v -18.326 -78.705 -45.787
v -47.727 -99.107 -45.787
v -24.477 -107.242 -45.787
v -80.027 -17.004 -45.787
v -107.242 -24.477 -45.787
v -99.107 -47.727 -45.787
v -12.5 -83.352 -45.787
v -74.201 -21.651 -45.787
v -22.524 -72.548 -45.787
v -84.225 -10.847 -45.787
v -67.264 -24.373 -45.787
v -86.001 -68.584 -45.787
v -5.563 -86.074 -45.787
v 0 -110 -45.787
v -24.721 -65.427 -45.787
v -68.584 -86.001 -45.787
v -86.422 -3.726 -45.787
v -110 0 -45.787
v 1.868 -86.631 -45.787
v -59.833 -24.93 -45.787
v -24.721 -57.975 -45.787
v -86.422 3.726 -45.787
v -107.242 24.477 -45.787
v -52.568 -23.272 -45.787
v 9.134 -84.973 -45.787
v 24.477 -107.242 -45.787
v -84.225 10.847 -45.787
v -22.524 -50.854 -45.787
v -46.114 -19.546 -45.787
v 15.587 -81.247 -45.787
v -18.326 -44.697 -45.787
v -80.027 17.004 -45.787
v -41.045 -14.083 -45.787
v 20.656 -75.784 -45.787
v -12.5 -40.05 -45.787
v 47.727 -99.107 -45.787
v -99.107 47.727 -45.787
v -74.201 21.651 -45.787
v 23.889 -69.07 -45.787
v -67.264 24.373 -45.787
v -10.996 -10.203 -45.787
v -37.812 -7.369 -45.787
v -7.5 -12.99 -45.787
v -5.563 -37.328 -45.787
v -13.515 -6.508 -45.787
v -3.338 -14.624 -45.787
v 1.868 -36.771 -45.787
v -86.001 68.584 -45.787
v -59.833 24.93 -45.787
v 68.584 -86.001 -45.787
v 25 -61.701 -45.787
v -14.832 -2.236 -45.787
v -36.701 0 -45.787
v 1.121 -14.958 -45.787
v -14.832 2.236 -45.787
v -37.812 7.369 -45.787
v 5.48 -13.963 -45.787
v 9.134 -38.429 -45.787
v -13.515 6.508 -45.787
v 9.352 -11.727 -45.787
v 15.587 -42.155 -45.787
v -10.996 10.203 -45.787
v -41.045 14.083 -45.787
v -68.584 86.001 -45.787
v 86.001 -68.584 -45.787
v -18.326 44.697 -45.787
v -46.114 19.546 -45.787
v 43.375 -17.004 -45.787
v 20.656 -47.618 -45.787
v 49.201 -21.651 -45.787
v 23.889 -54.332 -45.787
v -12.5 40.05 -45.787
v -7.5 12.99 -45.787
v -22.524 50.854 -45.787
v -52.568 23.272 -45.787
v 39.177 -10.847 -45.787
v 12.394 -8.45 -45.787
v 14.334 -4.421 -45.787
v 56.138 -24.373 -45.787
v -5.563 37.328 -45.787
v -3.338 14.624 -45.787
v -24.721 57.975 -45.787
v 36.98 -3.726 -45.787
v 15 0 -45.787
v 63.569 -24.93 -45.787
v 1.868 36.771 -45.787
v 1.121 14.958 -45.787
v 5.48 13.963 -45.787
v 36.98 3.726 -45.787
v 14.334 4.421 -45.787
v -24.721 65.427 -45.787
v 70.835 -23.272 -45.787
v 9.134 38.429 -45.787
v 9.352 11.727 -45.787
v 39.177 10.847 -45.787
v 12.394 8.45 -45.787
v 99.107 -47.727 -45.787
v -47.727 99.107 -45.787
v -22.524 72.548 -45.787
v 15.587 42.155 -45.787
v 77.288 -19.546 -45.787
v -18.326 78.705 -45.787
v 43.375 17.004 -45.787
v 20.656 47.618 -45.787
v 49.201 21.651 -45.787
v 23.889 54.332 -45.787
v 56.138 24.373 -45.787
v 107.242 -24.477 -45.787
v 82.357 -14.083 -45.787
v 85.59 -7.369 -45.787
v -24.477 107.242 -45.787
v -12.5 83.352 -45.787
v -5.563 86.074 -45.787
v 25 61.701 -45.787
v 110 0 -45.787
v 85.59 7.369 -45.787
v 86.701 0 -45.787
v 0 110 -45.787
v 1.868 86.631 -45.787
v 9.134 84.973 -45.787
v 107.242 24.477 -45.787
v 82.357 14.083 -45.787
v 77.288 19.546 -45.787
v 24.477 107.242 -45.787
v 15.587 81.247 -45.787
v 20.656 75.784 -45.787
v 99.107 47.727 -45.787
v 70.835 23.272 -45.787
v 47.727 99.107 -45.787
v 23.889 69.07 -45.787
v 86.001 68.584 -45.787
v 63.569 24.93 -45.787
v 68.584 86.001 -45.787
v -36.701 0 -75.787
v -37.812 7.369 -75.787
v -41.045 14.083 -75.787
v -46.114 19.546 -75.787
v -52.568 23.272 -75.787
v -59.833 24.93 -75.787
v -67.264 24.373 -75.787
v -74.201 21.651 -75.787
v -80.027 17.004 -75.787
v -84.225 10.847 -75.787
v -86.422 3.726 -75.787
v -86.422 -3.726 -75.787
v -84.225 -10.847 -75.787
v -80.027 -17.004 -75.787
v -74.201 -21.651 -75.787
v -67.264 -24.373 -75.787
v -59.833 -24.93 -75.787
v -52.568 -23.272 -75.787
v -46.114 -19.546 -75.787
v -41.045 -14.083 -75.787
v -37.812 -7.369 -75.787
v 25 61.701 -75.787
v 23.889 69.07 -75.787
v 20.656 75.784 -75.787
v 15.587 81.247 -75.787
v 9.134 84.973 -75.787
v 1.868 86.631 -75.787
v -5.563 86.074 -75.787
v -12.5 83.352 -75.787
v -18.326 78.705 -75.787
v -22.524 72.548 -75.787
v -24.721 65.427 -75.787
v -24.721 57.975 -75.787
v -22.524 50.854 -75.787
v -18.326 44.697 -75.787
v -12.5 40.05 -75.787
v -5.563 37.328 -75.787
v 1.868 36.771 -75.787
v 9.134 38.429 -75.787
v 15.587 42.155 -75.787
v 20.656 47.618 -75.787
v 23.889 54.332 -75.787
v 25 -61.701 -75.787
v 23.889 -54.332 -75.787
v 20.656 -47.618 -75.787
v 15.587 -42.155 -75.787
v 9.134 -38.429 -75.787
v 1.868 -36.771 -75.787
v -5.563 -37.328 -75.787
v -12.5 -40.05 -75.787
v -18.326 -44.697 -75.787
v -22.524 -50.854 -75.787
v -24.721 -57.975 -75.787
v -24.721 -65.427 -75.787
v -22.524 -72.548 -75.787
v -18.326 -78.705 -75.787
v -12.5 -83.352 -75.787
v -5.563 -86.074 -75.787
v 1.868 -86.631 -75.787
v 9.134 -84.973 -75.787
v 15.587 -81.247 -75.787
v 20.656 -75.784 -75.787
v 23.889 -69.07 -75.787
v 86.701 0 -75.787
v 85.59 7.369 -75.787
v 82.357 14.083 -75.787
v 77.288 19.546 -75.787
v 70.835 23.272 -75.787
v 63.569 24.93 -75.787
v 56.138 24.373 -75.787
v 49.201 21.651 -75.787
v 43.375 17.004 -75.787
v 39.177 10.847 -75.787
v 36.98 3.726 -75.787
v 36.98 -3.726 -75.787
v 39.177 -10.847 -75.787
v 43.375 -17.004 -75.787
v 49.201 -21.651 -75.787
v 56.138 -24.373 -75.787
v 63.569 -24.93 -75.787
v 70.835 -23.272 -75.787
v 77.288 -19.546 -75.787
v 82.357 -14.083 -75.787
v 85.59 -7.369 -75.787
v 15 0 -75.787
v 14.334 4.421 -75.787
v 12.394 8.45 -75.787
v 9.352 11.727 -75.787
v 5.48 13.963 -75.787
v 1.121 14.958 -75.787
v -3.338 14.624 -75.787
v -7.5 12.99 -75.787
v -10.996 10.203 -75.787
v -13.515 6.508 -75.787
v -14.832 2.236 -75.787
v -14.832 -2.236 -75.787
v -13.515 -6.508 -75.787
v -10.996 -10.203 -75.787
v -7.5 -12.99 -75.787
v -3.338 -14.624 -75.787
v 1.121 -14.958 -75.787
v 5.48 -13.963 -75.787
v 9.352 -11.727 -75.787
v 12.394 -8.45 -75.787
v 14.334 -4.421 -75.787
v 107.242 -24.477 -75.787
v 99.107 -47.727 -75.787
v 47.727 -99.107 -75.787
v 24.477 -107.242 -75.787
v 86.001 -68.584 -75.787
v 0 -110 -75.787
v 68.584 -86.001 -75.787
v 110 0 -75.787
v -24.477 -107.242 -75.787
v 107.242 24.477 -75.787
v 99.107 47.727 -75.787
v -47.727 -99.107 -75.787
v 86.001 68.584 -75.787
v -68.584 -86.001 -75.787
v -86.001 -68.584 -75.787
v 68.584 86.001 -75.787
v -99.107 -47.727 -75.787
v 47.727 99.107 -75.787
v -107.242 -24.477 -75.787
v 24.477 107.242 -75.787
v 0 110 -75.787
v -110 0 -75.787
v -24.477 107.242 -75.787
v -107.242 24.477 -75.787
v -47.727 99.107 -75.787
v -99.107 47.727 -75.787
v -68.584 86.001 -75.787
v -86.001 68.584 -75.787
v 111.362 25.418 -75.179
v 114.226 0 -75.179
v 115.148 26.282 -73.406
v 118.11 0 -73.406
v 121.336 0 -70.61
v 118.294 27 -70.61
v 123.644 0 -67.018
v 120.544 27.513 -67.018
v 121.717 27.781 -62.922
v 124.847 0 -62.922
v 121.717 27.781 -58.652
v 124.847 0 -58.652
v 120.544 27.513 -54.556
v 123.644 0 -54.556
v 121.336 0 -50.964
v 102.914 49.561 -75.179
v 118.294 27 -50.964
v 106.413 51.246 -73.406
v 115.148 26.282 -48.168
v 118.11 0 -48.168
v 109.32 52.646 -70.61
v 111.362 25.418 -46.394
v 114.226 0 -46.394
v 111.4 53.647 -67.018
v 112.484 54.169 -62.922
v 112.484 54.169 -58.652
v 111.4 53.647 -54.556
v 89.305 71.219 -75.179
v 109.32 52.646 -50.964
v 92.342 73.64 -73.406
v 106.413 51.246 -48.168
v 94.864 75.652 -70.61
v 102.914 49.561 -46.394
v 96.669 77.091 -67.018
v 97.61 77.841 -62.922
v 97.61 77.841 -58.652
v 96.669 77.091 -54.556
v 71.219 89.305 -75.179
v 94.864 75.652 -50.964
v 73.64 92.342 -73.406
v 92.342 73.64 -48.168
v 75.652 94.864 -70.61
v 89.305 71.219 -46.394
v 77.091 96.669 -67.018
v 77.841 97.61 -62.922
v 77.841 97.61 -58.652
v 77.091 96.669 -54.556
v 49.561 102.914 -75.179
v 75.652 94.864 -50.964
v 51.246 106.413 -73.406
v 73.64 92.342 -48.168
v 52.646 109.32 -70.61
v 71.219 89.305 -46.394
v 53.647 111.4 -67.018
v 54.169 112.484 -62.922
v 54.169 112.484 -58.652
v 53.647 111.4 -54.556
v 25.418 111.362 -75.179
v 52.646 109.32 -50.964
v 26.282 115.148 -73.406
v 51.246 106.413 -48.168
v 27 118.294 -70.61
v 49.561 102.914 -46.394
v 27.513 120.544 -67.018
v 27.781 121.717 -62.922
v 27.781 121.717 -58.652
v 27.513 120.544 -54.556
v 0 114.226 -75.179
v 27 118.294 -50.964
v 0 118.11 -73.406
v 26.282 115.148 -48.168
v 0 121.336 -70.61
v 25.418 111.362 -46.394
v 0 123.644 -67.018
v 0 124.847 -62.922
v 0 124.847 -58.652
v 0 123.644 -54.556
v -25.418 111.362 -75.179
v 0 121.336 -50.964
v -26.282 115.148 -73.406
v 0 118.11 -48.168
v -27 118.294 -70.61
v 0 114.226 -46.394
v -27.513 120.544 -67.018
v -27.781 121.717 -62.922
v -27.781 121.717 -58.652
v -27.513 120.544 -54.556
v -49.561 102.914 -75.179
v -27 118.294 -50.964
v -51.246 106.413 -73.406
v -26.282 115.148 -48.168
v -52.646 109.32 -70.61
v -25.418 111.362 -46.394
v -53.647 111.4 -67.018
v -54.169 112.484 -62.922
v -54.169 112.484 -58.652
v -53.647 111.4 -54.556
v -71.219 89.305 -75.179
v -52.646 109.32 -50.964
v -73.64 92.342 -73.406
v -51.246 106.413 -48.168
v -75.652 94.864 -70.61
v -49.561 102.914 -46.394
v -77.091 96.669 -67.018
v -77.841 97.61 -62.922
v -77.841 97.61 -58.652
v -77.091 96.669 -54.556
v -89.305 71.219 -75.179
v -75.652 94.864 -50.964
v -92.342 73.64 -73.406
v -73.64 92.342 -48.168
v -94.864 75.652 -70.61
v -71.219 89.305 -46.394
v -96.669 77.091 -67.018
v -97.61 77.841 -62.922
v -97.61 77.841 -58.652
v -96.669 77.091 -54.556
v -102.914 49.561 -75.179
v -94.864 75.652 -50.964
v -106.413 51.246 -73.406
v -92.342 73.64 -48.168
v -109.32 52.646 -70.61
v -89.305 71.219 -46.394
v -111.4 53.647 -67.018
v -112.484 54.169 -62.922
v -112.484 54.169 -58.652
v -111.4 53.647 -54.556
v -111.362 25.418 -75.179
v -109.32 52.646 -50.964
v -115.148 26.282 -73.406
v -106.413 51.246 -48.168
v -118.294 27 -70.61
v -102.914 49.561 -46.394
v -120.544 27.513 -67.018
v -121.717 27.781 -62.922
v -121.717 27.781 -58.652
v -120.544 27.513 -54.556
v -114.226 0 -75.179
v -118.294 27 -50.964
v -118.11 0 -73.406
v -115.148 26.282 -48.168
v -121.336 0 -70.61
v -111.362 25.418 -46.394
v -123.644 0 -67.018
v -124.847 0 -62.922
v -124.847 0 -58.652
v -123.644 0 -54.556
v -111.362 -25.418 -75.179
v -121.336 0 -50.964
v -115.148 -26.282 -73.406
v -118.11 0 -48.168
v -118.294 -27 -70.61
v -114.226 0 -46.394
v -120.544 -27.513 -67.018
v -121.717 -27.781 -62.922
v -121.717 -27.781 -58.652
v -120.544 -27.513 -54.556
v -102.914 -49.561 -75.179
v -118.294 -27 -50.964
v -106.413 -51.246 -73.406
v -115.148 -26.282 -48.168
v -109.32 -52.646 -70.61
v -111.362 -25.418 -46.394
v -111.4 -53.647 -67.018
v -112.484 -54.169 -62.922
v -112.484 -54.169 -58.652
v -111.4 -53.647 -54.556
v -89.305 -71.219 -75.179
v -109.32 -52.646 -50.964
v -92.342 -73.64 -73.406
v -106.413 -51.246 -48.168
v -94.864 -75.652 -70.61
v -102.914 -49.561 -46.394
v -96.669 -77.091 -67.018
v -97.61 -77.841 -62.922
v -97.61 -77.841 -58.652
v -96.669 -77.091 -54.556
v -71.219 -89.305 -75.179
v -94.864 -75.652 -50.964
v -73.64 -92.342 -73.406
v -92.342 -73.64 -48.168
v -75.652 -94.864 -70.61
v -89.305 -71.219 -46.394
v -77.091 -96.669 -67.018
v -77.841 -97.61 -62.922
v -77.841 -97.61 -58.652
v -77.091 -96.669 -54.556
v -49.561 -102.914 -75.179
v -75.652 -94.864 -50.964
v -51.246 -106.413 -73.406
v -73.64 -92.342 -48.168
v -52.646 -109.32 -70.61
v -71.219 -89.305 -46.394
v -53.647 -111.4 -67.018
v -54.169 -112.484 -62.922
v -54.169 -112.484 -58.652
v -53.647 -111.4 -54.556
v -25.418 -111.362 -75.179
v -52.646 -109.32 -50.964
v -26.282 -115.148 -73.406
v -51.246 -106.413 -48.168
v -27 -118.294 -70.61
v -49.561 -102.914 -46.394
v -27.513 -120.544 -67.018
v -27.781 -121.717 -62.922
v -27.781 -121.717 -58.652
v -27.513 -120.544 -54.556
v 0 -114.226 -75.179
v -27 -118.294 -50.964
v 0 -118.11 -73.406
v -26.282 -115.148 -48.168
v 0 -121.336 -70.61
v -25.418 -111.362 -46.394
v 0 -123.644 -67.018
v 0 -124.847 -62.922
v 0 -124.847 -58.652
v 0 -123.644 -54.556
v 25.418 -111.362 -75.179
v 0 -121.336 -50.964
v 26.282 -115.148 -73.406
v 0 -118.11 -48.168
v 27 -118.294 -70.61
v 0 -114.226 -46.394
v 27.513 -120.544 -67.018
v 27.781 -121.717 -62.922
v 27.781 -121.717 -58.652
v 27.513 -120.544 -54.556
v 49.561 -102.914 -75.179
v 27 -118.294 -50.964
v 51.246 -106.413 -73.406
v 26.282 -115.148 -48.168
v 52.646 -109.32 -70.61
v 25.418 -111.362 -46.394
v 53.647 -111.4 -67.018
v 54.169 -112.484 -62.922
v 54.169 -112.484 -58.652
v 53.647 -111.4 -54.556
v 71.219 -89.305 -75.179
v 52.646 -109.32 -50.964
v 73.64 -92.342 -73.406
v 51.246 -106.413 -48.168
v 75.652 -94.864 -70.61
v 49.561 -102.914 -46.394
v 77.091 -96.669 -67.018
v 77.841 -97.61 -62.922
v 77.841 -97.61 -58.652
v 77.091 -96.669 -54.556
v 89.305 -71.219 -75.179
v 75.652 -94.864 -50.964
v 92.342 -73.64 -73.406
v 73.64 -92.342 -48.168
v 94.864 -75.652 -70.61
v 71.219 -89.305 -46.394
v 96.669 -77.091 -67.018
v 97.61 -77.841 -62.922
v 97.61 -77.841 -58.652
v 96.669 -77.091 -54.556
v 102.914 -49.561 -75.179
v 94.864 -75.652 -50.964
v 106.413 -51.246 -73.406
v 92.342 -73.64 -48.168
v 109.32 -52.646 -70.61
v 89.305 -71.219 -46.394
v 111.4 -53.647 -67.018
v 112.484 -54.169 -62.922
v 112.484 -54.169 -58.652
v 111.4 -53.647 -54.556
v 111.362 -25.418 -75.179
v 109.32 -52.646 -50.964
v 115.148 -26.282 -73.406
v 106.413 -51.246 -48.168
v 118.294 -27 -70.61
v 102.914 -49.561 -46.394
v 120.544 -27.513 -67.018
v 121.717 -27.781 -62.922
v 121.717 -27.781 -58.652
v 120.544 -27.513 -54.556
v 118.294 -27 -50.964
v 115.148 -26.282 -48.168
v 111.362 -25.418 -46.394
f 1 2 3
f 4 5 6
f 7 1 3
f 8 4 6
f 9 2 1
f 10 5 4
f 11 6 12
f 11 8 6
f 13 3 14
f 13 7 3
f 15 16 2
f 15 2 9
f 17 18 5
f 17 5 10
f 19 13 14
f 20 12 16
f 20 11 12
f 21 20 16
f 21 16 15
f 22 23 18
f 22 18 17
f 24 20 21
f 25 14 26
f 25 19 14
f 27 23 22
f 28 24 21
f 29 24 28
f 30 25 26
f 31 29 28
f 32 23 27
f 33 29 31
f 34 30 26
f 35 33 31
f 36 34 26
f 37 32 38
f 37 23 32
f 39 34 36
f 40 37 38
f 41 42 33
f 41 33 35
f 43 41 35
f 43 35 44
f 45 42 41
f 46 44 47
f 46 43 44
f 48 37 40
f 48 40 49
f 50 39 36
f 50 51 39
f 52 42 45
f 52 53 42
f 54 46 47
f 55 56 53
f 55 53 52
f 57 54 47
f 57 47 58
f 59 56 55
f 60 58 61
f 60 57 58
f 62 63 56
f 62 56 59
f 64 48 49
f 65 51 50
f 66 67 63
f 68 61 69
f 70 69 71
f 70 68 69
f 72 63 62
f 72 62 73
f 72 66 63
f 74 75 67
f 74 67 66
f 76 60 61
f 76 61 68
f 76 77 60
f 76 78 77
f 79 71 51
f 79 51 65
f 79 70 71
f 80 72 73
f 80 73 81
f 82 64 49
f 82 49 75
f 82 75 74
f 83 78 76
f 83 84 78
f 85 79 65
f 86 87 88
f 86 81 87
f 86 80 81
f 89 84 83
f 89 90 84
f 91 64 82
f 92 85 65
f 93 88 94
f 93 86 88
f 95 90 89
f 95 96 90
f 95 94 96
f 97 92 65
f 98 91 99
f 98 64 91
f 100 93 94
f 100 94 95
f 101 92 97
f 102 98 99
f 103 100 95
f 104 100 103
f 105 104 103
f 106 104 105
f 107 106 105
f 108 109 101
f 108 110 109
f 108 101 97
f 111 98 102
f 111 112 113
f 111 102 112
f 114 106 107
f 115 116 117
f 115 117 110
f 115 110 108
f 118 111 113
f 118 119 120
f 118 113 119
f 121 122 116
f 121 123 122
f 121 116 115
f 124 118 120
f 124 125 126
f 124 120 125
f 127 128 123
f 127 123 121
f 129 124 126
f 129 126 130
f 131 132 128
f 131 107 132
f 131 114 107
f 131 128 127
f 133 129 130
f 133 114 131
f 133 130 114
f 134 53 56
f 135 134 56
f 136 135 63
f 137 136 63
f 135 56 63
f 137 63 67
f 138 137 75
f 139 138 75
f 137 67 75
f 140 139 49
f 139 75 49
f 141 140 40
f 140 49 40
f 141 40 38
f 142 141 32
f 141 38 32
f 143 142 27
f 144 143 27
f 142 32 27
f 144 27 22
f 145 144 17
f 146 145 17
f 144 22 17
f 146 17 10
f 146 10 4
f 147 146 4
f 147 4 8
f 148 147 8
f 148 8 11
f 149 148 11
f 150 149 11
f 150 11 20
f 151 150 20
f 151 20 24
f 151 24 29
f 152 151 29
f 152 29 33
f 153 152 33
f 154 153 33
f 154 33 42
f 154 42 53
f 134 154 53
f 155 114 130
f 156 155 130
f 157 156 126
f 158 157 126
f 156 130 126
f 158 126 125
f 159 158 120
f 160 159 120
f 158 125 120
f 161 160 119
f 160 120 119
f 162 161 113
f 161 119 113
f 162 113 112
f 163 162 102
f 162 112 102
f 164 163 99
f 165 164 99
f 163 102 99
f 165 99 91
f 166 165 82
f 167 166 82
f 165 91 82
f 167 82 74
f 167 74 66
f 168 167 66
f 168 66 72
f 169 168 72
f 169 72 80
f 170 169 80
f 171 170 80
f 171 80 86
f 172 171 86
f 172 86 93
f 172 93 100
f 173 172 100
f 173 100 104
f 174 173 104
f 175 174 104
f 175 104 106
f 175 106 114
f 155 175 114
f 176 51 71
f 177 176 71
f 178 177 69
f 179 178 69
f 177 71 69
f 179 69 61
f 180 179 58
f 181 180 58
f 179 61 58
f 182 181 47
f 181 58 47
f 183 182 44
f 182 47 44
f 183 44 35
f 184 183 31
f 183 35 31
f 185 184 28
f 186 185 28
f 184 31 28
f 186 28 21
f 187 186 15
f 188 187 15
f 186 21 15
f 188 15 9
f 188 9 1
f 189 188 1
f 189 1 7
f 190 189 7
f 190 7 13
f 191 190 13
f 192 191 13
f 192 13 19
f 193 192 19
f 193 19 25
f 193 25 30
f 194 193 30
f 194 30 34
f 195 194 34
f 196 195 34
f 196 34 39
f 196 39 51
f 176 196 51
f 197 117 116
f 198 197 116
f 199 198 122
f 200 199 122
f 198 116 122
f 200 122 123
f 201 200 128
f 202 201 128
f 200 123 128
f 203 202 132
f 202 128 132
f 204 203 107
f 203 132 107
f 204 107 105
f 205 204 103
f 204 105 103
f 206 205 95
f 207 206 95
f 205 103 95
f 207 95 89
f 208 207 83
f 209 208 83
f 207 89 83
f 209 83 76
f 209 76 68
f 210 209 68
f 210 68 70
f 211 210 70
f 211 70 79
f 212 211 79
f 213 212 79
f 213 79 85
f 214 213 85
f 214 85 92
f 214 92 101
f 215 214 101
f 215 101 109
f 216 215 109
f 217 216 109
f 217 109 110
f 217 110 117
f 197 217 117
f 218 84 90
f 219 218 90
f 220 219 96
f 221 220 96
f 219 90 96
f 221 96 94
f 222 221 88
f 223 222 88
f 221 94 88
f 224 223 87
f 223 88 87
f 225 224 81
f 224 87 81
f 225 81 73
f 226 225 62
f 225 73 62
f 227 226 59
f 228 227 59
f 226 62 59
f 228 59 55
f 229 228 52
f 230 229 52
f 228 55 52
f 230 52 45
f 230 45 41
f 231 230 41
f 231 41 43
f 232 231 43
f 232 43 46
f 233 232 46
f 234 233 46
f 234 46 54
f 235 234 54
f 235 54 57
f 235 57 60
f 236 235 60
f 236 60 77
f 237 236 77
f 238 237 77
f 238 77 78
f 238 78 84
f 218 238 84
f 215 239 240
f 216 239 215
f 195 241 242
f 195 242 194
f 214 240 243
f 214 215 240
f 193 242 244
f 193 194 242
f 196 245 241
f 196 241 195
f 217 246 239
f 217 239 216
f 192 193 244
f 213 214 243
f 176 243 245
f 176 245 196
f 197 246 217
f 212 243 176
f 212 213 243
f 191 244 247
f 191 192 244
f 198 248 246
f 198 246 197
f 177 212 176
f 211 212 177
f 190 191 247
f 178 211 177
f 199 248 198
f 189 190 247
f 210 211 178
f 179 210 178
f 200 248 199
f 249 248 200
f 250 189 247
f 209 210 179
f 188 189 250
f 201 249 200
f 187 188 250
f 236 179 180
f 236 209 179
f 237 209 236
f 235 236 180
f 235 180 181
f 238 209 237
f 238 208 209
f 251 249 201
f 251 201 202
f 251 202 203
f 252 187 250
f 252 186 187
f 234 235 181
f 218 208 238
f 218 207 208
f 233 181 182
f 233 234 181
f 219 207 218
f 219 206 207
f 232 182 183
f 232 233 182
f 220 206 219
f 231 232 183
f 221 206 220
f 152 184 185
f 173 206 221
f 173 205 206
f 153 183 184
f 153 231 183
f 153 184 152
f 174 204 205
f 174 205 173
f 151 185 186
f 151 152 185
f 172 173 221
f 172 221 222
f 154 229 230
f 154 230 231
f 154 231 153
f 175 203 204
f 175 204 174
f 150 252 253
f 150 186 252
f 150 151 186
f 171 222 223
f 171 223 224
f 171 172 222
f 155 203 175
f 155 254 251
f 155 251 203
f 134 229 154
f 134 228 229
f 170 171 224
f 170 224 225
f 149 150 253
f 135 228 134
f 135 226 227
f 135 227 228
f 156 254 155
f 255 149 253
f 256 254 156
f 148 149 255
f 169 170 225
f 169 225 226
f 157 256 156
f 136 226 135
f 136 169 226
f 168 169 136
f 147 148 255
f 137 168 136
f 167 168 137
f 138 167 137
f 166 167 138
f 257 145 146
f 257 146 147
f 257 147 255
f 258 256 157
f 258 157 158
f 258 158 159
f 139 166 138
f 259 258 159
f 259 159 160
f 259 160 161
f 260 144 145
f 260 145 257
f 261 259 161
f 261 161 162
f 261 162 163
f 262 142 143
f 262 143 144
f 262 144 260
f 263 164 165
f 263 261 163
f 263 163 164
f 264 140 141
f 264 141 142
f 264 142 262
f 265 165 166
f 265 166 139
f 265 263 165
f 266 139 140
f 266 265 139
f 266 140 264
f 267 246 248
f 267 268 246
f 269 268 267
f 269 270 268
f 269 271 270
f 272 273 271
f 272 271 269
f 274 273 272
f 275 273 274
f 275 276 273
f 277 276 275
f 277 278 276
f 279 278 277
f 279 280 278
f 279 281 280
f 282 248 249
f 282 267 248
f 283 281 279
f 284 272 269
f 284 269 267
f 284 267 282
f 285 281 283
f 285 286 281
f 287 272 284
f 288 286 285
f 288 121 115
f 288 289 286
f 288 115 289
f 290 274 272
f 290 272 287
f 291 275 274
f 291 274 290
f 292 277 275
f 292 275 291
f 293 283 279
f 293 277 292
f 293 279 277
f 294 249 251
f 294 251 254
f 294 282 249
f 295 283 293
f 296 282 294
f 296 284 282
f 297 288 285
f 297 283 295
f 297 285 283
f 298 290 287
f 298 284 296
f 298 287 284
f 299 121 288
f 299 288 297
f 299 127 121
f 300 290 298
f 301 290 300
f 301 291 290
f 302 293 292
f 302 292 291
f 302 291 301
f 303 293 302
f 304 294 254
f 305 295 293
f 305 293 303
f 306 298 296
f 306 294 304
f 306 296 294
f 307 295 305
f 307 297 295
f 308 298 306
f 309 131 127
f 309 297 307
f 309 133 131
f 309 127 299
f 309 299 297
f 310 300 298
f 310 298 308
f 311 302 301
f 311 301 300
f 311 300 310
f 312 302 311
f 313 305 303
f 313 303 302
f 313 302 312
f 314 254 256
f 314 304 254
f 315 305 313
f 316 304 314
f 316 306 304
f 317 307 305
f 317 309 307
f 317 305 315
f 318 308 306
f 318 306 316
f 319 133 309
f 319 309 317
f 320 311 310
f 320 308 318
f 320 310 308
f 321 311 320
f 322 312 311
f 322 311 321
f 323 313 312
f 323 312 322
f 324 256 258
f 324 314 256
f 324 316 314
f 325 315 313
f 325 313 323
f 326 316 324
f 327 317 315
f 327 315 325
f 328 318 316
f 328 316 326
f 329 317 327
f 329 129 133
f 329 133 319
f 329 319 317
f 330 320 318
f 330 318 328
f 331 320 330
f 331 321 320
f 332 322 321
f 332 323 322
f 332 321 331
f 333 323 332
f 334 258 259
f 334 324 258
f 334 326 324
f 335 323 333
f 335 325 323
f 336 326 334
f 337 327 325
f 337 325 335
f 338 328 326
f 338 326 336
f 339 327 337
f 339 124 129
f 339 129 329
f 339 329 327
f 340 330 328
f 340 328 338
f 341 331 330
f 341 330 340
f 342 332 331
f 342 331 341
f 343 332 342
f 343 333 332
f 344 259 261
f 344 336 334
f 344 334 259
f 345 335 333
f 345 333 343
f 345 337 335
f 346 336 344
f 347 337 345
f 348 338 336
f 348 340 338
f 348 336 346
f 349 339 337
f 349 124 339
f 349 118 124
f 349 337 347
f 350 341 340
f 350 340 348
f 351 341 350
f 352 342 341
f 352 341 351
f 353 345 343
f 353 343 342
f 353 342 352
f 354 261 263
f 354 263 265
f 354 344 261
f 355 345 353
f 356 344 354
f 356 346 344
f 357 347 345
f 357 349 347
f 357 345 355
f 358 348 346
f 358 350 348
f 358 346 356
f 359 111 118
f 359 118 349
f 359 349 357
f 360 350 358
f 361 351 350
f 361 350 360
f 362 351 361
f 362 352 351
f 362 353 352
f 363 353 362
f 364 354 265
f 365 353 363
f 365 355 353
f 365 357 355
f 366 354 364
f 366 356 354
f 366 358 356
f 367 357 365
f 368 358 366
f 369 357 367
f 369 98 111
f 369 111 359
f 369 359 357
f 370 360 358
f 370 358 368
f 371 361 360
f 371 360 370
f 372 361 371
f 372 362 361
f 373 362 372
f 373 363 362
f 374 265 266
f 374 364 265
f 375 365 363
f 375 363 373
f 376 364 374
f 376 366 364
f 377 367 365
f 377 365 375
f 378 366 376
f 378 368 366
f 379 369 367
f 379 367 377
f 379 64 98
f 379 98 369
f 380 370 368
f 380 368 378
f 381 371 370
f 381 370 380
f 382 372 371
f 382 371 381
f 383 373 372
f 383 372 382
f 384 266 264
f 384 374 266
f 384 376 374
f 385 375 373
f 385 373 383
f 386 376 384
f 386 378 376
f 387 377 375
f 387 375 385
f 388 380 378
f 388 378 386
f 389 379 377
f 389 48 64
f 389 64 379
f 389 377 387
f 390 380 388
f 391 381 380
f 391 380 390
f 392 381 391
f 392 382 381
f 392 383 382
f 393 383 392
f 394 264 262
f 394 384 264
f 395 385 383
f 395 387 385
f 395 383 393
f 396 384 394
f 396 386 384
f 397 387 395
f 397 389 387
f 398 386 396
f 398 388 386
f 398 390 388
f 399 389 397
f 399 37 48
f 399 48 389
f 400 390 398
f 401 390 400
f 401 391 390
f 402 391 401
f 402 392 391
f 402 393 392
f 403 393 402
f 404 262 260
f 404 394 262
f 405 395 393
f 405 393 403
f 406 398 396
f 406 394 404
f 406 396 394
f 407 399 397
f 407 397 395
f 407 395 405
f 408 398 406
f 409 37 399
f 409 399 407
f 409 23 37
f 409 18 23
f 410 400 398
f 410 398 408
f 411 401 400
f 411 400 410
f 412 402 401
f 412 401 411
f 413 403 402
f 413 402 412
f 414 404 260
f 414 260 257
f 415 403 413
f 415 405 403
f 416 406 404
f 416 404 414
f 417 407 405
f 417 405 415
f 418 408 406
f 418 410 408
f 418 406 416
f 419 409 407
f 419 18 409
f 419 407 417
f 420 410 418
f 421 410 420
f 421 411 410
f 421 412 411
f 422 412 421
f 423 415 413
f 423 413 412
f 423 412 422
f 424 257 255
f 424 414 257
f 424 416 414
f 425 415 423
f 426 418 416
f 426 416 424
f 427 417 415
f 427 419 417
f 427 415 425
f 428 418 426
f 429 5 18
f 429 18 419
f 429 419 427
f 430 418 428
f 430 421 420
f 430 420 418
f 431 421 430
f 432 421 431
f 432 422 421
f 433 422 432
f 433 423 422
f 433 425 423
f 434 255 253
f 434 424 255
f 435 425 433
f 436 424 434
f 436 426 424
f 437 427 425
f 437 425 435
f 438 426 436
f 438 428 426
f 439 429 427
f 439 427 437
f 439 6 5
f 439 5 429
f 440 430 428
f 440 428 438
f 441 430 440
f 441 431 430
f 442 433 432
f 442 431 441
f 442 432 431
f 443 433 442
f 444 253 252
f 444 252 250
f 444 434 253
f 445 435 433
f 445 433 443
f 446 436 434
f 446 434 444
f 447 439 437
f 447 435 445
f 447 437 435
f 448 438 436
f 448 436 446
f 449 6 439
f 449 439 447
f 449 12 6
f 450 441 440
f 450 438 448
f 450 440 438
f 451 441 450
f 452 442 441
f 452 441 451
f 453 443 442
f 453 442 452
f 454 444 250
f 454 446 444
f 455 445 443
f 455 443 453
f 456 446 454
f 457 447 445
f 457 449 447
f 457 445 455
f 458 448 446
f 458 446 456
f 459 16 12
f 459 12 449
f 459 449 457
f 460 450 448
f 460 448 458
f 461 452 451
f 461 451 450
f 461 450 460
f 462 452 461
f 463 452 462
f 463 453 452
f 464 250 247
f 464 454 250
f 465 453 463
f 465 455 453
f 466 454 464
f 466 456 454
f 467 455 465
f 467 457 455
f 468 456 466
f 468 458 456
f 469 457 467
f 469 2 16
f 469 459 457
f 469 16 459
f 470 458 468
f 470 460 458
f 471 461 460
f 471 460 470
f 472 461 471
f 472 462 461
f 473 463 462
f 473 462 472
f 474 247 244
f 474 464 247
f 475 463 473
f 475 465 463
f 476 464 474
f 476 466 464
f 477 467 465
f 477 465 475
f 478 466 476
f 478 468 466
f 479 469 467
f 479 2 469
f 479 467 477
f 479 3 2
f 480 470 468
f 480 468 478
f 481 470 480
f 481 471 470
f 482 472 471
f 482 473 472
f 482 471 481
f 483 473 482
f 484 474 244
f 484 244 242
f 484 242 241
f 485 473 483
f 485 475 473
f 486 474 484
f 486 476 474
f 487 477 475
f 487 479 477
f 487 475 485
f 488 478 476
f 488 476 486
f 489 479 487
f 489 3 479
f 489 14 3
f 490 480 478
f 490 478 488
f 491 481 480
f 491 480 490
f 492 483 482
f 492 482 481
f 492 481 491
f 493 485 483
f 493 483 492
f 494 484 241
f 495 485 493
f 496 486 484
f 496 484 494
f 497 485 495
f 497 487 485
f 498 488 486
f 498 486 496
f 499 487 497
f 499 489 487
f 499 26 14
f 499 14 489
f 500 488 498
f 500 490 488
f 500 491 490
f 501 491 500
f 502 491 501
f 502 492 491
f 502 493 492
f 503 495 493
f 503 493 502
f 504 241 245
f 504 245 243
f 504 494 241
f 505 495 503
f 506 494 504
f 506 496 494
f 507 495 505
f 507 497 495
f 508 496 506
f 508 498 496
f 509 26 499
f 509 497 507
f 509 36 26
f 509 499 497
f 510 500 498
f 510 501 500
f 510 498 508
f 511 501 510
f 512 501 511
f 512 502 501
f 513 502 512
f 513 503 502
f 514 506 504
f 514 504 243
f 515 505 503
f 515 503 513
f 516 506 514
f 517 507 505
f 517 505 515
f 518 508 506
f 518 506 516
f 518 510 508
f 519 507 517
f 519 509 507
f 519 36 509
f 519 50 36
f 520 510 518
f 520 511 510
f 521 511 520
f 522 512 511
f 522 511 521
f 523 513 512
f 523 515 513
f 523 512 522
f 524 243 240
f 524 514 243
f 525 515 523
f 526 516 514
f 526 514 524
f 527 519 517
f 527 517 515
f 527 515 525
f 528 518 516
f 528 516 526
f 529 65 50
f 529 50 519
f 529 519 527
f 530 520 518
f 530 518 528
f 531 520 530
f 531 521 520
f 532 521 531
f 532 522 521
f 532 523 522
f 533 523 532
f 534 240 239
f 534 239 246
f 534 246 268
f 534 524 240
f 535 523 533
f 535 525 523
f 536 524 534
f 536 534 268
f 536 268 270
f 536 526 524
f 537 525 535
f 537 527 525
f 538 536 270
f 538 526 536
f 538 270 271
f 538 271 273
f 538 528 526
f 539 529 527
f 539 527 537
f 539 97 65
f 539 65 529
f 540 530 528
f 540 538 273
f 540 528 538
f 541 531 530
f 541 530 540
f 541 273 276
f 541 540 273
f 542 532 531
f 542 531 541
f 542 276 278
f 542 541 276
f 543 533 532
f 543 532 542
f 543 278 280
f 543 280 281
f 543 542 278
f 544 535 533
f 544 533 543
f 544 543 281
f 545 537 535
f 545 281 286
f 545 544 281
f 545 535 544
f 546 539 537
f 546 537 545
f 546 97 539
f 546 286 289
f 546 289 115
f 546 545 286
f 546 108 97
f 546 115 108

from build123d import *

# Parameters (mm, degrees)
SKETCH10_R         = 15
CUT_EXTRUDE1_DEPTH = 31
SKETCH11_R         = 25
CUT_EXTRUDE2_DEPTH = 31


with BuildPart() as part:
    # Sketch6 → Revolve3 (revolve)
    with BuildSketch(Plane(origin=(0, 0, 0), x_dir=(1, 0, 0), z_dir=(0, 1, 0))):
        with BuildLine():
            Line((-1.369e-06, 75.786874096), (109.999998631, 75.786874096))
            ThreePointArc((109.999998631, 75.786874096), (124.999998631, 60.786874096), (109.999998631, 45.786874096))
            Line((109.999998631, 45.786874096), (-1.369e-06, 45.786874096))
            Line((-1.369e-06, 45.786874096), (-1.369e-06, 75.786874096))
        make_face()
    revolve(axis=Axis((-1.369e-06, 0, -75.786874096), (0, 0, 1)))

    # Sketch10 → Cut-Extrude1 (cut, through all)
    with BuildSketch(Plane.XY.offset(-45.786874096)):
        Circle(SKETCH10_R)
    extrude(amount=-CUT_EXTRUDE1_DEPTH, mode=Mode.SUBTRACT)

    # Sketch11 → Cut-Extrude2 (cut, through all)
    with BuildSketch(Plane.XY.offset(-45.786874096)):
        with Locations((0, 61.701118812)):
            Circle(SKETCH11_R)
        with Locations((61.701118812, 0)):
            Circle(SKETCH11_R)
        with Locations((0, -61.701118812)):
            Circle(SKETCH11_R)
        with Locations((-61.701118812, 0)):
            Circle(SKETCH11_R)
    extrude(amount=-CUT_EXTRUDE2_DEPTH, mode=Mode.SUBTRACT)


solid = part.part
